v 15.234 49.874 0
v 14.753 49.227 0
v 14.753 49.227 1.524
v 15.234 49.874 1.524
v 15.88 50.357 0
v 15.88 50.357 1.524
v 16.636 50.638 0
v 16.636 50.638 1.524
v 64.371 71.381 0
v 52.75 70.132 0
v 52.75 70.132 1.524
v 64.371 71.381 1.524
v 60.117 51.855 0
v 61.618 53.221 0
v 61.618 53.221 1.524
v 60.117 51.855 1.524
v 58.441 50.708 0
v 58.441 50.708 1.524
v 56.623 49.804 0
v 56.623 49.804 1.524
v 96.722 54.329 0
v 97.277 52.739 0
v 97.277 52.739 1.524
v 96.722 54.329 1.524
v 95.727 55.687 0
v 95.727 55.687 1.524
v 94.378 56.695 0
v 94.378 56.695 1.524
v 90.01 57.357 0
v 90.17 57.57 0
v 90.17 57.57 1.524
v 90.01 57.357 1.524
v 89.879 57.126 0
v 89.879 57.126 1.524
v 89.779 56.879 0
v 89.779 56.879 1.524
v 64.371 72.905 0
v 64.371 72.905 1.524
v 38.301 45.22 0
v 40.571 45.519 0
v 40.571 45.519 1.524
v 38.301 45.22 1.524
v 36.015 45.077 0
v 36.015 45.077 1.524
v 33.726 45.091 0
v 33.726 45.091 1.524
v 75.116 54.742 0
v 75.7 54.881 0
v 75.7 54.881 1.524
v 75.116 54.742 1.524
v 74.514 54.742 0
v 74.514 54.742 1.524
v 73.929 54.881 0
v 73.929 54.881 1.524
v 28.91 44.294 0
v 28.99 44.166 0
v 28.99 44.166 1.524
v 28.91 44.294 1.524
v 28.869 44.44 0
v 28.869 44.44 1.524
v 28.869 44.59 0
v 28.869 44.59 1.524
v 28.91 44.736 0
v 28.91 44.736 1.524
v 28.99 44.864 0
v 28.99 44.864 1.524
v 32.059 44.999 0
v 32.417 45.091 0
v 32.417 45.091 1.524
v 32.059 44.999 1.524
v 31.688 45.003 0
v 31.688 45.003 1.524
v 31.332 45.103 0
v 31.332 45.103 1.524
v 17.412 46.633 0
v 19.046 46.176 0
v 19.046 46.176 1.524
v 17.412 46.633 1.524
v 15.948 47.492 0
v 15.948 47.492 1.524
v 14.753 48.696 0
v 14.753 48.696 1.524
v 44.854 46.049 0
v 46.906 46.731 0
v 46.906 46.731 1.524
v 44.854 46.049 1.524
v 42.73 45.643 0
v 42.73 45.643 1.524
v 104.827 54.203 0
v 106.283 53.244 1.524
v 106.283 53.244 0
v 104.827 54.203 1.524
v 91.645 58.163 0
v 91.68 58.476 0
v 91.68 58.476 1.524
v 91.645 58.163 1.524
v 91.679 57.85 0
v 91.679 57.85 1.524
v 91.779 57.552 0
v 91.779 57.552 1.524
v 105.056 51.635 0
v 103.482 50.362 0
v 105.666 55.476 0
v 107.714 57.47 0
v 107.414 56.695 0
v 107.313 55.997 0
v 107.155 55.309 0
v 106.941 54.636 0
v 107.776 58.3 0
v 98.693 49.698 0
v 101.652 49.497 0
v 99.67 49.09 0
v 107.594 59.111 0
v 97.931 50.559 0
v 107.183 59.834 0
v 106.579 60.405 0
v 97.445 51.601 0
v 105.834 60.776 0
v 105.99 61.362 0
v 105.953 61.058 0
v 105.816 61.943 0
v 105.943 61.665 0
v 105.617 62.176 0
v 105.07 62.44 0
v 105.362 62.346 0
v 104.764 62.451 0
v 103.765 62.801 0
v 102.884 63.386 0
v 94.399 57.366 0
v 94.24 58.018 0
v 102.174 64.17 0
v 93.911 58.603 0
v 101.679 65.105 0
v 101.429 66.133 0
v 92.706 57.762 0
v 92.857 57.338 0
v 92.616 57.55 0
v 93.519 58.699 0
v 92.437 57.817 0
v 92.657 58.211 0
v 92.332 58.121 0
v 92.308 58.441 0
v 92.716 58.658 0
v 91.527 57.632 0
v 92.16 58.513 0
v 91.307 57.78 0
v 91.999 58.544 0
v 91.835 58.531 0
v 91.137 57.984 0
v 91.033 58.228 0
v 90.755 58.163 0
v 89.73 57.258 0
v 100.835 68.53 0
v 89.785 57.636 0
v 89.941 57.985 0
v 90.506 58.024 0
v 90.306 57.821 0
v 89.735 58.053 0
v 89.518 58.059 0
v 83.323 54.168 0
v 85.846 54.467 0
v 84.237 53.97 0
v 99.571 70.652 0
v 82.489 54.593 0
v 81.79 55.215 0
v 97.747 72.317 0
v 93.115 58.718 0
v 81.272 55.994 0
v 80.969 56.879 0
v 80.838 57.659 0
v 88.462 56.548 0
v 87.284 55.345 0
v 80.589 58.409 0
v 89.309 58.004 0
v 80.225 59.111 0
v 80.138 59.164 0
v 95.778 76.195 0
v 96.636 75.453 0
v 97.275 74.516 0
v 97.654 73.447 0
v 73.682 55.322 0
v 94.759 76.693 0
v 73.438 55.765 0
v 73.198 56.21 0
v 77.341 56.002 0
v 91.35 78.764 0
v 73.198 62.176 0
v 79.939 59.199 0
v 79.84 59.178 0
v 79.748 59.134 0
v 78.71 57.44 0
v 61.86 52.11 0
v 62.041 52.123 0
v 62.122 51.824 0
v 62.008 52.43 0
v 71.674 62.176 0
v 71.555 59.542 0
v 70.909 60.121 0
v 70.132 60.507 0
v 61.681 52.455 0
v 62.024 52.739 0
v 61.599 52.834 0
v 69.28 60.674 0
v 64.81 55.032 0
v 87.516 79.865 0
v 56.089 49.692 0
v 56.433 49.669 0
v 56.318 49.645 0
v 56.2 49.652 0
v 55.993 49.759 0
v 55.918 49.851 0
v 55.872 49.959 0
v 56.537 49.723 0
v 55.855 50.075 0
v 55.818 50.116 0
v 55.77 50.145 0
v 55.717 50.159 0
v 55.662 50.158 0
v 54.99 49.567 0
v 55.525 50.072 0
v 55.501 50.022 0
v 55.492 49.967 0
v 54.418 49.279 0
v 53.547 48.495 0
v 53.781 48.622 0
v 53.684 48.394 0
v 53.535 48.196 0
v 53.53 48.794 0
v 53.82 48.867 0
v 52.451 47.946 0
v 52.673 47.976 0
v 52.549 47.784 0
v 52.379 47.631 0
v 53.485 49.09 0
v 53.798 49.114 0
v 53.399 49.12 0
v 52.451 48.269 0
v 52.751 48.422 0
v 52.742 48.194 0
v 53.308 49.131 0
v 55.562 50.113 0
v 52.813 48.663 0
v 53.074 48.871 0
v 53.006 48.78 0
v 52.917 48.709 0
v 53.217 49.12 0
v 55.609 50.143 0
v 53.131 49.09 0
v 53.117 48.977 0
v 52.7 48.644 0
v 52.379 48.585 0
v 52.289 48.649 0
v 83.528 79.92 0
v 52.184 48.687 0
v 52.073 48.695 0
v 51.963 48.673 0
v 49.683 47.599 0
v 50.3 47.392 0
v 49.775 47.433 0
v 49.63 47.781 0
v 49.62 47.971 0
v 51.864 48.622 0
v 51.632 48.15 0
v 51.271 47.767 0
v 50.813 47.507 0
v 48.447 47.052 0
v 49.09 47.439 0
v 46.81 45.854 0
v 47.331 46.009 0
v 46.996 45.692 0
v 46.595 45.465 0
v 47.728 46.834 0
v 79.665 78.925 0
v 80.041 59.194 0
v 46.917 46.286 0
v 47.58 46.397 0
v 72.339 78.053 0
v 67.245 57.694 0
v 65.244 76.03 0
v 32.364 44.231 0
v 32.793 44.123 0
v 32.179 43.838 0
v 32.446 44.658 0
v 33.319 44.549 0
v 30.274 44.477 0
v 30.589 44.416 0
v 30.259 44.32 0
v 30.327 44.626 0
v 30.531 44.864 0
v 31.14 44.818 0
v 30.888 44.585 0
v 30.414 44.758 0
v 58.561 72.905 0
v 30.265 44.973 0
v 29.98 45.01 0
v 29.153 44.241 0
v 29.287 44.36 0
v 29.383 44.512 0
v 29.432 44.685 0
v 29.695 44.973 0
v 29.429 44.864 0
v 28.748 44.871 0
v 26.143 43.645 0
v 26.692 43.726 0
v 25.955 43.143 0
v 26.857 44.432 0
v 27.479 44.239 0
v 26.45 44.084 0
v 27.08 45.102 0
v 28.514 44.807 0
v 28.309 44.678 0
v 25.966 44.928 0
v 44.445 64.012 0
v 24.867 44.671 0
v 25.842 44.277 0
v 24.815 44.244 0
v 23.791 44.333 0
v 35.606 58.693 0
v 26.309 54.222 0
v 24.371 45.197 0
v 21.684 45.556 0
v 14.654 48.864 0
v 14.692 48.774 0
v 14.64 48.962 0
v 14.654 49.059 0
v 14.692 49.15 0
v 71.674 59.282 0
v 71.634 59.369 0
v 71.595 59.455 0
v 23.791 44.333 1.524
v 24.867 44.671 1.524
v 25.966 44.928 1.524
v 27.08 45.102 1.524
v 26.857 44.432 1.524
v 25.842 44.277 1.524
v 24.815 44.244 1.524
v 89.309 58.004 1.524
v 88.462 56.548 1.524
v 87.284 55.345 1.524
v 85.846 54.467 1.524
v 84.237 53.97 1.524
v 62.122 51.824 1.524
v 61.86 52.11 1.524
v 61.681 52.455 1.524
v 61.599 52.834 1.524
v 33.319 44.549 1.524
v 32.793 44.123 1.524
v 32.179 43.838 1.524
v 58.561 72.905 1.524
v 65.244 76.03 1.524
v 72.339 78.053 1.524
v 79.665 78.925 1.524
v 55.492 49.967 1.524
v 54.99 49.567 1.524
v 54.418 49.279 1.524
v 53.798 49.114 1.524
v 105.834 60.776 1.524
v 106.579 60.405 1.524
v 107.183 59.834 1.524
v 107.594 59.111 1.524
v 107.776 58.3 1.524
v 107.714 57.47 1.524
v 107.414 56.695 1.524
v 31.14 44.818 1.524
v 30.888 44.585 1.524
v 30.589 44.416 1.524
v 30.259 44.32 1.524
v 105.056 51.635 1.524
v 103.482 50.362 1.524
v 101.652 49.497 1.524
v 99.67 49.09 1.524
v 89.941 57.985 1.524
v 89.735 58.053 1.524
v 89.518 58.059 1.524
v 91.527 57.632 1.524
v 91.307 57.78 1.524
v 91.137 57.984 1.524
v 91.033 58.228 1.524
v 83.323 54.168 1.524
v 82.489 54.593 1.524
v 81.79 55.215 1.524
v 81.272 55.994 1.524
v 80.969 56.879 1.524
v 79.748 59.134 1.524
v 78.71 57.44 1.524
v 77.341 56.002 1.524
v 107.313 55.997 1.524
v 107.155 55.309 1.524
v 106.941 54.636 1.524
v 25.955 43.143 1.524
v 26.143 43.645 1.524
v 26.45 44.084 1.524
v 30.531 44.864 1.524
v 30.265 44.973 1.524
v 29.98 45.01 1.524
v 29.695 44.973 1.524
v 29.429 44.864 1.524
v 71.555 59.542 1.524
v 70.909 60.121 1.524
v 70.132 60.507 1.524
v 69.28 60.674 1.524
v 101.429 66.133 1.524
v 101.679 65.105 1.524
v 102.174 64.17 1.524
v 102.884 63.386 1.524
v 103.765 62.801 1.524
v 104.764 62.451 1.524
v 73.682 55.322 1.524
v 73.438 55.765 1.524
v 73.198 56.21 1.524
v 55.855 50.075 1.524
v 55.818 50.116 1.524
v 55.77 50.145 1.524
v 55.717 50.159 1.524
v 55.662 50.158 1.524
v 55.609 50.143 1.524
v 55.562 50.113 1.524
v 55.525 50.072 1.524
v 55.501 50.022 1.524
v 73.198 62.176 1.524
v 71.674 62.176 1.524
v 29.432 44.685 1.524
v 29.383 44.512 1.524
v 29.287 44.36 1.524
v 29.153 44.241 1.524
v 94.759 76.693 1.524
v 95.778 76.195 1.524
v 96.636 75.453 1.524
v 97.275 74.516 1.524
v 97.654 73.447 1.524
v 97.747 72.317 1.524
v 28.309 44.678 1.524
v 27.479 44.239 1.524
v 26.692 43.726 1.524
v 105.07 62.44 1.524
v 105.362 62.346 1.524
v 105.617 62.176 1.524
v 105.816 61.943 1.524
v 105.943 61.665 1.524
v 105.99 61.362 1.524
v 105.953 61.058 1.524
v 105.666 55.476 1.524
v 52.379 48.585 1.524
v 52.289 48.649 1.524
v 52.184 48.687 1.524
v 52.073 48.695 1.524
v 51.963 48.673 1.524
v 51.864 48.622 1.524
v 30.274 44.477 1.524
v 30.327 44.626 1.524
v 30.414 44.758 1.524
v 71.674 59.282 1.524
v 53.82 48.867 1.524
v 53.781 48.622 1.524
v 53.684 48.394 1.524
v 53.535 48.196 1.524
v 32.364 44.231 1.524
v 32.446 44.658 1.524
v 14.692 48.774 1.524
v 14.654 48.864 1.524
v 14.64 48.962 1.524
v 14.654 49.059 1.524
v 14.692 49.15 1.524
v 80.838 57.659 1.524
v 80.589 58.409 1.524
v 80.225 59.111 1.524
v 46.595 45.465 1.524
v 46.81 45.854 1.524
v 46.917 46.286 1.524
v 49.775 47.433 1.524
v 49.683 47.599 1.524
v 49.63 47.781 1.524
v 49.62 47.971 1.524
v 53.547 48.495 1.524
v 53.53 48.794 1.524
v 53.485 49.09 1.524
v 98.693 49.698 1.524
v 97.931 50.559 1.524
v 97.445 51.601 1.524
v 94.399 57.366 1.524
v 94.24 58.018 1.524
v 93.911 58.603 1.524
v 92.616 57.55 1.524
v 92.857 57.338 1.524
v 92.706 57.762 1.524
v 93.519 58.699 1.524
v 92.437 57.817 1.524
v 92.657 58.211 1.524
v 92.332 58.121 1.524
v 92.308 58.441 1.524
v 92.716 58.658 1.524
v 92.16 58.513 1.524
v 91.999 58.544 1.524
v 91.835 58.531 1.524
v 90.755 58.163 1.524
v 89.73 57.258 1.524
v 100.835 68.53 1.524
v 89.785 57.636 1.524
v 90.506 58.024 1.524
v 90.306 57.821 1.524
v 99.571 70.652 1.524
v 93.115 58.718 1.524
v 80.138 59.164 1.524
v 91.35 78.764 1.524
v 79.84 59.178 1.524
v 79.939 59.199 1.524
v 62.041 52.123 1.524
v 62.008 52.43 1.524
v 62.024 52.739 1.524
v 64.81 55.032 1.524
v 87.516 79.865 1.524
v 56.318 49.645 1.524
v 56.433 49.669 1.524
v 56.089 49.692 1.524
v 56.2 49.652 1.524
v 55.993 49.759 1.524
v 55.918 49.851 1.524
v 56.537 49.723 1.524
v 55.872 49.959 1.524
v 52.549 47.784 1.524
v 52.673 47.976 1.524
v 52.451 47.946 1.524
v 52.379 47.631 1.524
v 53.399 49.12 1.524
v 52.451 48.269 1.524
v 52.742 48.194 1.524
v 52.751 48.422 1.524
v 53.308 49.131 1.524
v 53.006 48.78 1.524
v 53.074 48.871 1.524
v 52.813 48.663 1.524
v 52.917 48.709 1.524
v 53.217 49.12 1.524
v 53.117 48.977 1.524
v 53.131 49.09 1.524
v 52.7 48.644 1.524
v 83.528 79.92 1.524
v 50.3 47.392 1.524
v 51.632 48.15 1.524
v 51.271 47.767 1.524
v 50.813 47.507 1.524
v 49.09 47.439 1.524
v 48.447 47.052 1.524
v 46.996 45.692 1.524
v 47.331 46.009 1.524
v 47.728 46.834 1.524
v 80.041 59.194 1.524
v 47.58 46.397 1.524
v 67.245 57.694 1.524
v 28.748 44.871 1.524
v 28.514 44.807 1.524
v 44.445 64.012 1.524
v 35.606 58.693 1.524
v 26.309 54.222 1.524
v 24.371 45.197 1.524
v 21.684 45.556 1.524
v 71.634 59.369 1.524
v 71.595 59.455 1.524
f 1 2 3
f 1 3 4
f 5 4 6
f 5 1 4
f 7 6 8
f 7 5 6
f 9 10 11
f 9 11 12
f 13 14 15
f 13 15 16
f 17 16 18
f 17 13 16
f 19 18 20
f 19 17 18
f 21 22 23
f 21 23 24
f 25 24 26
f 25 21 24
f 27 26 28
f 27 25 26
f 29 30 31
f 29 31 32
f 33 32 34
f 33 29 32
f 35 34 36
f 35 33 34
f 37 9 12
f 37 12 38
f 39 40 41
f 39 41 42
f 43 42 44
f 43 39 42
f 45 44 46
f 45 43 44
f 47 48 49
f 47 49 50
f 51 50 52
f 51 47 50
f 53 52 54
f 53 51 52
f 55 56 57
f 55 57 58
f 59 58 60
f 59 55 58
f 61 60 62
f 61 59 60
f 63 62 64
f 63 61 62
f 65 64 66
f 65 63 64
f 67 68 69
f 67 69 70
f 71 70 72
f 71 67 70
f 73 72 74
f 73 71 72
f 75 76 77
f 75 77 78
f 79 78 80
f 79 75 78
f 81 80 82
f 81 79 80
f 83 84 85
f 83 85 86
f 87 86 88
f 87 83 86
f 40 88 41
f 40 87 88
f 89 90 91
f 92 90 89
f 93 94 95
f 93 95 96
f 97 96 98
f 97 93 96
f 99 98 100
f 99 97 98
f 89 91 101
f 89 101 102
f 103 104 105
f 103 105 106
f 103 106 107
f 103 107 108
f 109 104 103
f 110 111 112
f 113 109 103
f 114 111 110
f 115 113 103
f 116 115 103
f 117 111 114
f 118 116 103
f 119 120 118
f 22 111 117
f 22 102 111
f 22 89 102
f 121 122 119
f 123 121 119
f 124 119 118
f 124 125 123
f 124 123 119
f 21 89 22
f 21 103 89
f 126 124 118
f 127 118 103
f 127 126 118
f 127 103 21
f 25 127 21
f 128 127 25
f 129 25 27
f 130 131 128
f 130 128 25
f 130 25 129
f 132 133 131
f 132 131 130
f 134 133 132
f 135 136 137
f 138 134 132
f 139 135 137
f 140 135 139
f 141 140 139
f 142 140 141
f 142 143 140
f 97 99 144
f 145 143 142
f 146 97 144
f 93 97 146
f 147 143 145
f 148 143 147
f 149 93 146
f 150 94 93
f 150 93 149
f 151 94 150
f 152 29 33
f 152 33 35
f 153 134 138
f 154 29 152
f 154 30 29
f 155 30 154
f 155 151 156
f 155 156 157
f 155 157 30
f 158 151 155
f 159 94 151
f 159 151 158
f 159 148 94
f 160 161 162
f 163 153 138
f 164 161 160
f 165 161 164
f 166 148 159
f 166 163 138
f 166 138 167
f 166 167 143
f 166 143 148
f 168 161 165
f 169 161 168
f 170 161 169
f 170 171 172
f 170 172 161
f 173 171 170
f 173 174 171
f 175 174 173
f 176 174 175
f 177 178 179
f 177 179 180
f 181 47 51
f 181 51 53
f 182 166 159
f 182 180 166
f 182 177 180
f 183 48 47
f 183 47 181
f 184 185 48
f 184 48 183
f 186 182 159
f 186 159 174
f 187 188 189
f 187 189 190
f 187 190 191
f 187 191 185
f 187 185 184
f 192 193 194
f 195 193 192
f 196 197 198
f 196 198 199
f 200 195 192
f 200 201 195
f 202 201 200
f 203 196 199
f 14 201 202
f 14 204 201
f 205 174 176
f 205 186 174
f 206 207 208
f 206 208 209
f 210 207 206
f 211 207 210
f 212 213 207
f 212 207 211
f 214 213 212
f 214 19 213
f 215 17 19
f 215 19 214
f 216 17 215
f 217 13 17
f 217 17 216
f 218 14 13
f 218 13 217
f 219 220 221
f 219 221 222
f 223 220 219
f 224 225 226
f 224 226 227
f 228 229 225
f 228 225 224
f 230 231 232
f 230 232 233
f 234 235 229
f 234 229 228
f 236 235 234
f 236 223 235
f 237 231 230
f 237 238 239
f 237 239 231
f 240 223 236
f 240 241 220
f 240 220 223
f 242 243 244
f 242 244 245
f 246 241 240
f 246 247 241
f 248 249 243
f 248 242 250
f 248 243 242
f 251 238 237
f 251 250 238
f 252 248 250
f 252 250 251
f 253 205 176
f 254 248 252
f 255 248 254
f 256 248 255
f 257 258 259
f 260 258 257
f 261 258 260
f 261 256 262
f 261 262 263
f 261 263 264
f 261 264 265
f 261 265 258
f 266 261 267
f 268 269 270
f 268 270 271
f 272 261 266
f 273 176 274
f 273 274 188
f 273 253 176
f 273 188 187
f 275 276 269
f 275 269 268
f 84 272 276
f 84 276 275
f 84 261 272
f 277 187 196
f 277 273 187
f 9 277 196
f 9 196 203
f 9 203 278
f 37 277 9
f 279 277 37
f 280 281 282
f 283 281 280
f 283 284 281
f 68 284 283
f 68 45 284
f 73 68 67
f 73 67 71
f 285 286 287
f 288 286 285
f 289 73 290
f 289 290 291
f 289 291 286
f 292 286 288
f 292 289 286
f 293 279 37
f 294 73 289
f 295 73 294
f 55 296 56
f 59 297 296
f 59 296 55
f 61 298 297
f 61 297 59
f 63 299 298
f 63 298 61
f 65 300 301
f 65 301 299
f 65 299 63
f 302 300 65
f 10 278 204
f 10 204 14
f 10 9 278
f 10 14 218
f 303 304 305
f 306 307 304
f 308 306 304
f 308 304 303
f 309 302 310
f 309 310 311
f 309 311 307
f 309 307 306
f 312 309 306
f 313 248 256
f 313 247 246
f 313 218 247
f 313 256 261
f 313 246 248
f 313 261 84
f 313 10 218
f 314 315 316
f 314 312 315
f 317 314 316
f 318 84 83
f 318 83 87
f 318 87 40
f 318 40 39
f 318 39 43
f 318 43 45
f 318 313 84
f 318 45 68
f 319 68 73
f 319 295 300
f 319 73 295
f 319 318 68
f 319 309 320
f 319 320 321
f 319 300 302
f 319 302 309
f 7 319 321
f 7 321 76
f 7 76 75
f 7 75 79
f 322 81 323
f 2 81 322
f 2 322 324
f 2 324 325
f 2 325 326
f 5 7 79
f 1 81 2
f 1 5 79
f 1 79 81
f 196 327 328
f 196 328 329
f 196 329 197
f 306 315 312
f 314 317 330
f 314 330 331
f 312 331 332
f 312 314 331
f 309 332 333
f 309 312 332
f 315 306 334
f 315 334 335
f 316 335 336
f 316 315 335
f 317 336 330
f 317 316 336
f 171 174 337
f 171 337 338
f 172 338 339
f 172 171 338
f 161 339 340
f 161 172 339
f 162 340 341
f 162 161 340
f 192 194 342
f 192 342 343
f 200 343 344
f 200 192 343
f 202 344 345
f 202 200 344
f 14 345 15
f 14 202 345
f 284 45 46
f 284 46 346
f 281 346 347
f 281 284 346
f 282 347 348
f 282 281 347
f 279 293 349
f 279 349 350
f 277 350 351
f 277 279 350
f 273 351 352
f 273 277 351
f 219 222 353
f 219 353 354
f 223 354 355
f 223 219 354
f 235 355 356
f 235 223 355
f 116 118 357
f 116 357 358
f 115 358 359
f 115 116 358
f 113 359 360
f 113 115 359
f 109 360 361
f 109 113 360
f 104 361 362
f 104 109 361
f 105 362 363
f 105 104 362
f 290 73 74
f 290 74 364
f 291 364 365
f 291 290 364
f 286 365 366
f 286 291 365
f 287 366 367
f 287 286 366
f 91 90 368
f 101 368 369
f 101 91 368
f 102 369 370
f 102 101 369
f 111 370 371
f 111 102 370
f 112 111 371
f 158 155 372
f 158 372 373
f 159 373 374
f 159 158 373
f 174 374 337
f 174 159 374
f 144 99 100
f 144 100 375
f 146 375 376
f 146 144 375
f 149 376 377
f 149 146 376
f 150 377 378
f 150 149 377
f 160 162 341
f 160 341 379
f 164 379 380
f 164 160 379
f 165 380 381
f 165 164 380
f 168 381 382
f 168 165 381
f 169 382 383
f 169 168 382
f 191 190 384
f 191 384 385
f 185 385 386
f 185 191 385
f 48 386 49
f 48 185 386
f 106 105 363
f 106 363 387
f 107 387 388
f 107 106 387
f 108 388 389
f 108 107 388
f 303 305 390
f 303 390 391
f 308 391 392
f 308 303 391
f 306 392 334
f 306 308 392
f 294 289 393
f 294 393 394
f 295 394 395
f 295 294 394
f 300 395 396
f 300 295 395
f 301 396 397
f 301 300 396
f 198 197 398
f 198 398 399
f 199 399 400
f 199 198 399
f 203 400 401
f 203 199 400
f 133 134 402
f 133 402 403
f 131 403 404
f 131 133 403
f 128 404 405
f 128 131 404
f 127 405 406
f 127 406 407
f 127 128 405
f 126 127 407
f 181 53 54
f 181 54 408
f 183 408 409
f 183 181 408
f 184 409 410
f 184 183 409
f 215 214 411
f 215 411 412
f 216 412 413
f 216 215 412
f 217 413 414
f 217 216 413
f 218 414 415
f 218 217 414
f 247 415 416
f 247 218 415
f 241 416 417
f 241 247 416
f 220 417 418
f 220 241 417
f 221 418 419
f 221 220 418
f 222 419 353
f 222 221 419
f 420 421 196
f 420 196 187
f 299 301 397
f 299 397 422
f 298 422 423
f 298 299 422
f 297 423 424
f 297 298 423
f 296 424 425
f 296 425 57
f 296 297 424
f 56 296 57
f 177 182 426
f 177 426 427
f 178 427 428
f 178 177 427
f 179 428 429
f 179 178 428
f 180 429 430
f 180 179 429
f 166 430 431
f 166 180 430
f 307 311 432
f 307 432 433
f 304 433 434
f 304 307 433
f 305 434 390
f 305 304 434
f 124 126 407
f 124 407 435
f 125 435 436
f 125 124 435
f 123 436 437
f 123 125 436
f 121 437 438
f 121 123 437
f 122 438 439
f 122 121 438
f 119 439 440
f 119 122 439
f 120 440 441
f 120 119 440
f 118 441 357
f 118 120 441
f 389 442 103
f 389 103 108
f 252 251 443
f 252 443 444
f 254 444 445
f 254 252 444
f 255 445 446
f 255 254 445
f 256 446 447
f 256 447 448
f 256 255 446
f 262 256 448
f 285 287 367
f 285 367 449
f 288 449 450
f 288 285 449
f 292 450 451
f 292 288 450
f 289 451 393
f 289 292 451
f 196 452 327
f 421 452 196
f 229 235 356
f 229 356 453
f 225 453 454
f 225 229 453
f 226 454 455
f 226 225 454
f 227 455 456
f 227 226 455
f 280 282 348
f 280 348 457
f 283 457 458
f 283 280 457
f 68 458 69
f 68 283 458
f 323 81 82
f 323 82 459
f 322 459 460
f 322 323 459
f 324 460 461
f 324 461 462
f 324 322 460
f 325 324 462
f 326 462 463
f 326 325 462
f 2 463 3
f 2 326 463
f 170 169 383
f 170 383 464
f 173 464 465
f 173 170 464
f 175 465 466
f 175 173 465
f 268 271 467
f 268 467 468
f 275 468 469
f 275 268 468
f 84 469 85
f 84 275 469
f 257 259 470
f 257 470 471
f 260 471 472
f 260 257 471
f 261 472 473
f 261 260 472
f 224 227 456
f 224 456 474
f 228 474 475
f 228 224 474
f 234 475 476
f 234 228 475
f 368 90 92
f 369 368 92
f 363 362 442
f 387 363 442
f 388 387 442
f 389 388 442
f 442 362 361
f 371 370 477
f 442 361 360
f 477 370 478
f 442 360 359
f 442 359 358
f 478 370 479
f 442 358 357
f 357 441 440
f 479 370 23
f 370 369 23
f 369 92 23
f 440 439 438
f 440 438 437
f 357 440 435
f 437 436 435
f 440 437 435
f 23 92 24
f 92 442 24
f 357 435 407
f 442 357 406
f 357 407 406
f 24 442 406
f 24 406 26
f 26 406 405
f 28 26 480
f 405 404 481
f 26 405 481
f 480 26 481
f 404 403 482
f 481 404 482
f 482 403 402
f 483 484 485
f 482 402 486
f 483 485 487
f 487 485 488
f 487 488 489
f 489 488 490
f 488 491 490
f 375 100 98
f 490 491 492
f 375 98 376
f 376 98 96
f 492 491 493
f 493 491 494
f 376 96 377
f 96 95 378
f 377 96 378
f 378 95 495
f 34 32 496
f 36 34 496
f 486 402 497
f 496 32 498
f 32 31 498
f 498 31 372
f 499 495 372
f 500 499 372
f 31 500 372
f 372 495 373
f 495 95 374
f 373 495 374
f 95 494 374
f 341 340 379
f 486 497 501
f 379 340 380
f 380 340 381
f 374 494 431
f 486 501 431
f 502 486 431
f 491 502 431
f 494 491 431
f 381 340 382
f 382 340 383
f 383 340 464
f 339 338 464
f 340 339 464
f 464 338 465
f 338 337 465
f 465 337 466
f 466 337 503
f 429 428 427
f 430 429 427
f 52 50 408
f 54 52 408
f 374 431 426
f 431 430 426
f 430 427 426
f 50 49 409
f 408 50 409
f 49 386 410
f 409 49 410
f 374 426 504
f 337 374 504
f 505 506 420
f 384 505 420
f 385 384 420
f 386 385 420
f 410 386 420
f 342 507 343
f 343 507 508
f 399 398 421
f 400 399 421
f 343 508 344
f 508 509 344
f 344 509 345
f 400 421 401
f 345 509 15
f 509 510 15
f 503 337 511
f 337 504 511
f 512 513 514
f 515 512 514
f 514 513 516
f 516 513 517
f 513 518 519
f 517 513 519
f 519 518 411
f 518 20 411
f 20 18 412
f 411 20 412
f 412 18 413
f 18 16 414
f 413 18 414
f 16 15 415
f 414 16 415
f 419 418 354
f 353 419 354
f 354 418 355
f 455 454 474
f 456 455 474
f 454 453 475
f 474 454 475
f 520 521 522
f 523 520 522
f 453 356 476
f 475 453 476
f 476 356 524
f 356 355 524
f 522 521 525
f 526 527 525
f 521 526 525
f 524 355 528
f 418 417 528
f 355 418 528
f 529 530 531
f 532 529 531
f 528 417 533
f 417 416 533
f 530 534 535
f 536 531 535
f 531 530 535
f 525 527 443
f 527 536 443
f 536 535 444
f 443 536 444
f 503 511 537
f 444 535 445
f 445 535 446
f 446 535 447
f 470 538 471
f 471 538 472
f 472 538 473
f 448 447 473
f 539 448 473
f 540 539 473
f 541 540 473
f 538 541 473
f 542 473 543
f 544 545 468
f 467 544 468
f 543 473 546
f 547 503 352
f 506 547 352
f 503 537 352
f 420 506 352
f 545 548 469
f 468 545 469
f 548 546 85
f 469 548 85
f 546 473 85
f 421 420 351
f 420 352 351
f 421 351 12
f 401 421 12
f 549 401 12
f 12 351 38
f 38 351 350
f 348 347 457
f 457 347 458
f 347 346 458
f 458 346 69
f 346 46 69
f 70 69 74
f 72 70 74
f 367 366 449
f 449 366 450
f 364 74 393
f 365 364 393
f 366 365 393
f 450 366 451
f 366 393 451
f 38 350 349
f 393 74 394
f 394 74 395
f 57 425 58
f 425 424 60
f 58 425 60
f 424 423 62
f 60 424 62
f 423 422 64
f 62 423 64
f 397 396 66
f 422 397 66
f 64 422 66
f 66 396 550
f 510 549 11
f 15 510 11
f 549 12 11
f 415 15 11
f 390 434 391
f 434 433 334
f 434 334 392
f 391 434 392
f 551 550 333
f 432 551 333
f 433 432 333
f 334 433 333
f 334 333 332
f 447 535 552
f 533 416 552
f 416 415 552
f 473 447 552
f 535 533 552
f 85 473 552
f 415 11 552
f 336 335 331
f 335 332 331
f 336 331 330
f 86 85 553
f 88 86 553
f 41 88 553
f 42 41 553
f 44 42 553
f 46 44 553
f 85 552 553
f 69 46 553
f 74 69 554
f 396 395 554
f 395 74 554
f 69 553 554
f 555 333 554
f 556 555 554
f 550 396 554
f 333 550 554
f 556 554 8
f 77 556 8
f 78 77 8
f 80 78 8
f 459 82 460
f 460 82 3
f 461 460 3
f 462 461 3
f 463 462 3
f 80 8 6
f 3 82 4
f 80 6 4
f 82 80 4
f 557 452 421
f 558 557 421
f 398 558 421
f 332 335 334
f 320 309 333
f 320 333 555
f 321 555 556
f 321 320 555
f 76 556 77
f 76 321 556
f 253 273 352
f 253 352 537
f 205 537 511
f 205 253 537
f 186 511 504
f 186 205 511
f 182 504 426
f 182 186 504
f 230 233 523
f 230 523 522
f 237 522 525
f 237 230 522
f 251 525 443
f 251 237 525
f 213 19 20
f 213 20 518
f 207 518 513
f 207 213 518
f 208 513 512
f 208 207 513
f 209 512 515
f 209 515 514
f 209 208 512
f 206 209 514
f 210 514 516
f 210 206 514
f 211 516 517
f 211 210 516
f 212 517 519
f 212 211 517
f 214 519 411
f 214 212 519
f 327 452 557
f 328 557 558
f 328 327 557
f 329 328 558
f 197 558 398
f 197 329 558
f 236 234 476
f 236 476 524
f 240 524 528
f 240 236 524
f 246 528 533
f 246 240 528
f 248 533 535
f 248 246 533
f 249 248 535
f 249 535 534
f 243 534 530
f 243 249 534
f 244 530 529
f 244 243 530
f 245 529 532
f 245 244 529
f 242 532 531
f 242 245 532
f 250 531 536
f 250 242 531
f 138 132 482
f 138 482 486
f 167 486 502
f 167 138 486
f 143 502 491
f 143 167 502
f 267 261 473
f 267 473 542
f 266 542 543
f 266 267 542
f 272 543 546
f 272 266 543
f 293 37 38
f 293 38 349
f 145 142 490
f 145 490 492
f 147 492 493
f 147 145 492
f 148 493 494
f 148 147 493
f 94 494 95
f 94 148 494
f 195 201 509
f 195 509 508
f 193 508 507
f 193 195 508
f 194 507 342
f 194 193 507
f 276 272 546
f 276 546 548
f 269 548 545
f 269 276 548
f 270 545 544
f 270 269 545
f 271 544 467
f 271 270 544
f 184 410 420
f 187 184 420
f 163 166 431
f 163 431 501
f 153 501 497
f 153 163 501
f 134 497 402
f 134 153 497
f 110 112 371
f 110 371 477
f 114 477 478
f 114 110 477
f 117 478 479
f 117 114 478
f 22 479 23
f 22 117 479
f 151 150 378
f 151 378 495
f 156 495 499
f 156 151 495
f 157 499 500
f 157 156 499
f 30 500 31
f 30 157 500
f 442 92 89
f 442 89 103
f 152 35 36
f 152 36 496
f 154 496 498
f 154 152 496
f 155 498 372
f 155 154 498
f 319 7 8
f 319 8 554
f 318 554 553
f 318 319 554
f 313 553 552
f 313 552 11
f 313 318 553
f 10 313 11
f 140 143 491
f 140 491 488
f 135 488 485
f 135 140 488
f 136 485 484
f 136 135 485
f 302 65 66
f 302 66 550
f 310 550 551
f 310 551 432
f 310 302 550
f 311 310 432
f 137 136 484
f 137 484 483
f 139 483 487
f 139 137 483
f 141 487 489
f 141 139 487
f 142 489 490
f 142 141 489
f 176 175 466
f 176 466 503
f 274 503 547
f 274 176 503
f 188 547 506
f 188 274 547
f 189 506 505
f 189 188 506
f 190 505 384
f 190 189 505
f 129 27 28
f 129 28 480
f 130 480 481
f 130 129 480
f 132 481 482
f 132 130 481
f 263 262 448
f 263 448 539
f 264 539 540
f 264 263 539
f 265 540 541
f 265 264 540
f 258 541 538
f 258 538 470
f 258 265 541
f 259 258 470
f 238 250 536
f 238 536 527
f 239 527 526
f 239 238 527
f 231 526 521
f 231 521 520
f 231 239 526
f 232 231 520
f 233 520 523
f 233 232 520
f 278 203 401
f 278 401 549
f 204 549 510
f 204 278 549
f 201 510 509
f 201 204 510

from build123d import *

# Parameters (mm, degrees)
BOSS_EXTRUDE1_DEPTH = 1.524
SKETCH2_W           = 1.524
SKETCH2_H           = 5.96660367
CUT_EXTRUDE3_DEPTH  = 135.253240476


with BuildPart() as part:
    # Sketch1 → Boss-Extrude1 (new body)
    with BuildSketch(Plane.XY):
        with BuildLine():
            Line((52.749938031, 70.131845749), (64.371465794, 71.381472391))
            Line((64.371465794, 71.381472391), (64.371465794, 72.905472391))
            Line((64.371465794, 72.905472391), (58.560701913, 72.905472391))
            ThreePointArc((58.560701913, 72.905472391), (68.751288874, 77.18302052), (79.665108288, 78.924866217))
            ThreePointArc((79.665108288, 78.924866217), (87.51605356, 79.864840631), (94.759202069, 76.693453987))
            ThreePointArc((94.759202069, 76.693453987), (96.985502082, 75.005001445), (97.746636466, 72.316515219))
            ThreePointArc((97.746636466, 72.316515219), (100.280996817, 69.637712422), (101.428823049, 66.133220769))
            ThreePointArc((101.428823049, 66.133220769), (102.504441665, 63.756169776), (104.763633539, 62.451034186))
            ThreePointArc((104.763633539, 62.451034186), (105.815523966, 61.94348794), (105.834353574, 60.775702811))
            ThreePointArc((105.834353574, 60.775702811), (107.593647808, 59.110829557), (107.413611762, 56.69535731))
            ThreePointArc((107.413611762, 56.69535731), (104.915486102, 51.493806045), (99.669748601, 49.089849838))
            ThreePointArc((99.669748601, 49.089849838), (97.93078373, 50.558543058), (97.277362732, 52.738932839))
            ThreePointArc((97.277362732, 52.738932839), (96.275148178, 55.045205965), (94.377694548, 56.69535731))
            ThreePointArc((94.377694548, 56.69535731), (94.341947265, 57.697226126), (93.911436782, 58.602587774))
            ThreePointArc((93.911436782, 58.602587774), (93.31755476, 58.718236433), (92.715544448, 58.657787675))
            ThreePointArc((92.715544448, 58.657787675), (92.668251349, 57.985085863), (92.857476868, 57.337816162))
            ThreePointArc((92.857476868, 57.337816162), (92.437007408, 57.816991843), (92.308352921, 58.441373075))
            ThreePointArc((92.308352921, 58.441373075), (91.998939648, 58.544100362), (91.680077423, 58.476156637))
            ThreePointArc((91.680077423, 58.476156637), (91.653768646, 58.005927685), (91.779444676, 57.552041185))
            ThreePointArc((91.779444676, 57.552041185), (91.306585055, 57.779976677), (91.03290283, 58.22791512))
            ThreePointArc((91.03290283, 58.22791512), (90.50619799, 58.023829811), (90.170237064, 57.569738347))
            ThreePointArc((90.170237064, 57.569738347), (89.940738286, 57.243637966), (89.778811712, 56.879233065))
            ThreePointArc((89.778811712, 56.879233065), (89.744476135, 57.449042317), (89.940738286, 57.985085863))
            ThreePointArc((89.940738286, 57.985085863), (89.626896453, 58.063679483), (89.308840631, 58.00439924))
            ThreePointArc((89.308840631, 58.00439924), (87.283822401, 55.344960061), (84.23724791, 53.969569406))
            ThreePointArc((84.23724791, 53.969569406), (82.119422653, 54.881253432), (80.968584276, 56.879233065))
            ThreePointArc((80.968584276, 56.879233065), (80.728221934, 58.038765282), (80.225263479, 59.110829557))
            ThreePointArc((80.225263479, 59.110829557), (79.990436789, 59.199276584), (79.74821764, 59.133730156))
            ThreePointArc((79.74821764, 59.133730156), (78.063200875, 56.684963047), (75.700496179, 54.881253432))
            ThreePointArc((75.700496179, 54.881253432), (74.814943925, 54.724384759), (73.92939167, 54.881253432))
            ThreePointArc((73.92939167, 54.881253432), (72.689360724, 57.184690211), (71.555199225, 59.542056419))
            ThreePointArc((71.555199225, 59.542056419), (70.53318823, 60.33987445), (69.280379472, 60.673776077))
            ThreePointArc((69.280379472, 60.673776077), (66.074534091, 56.320096732), (62.023949735, 52.738932839))
            ThreePointArc((62.023949735, 52.738932839), (62.018158819, 52.275784748), (62.122280661, 51.824455233))
            ThreePointArc((62.122280661, 51.824455233), (61.681410811, 52.454602529), (61.618245883, 53.221063245))
            ThreePointArc((61.618245883, 53.221063245), (59.29856558, 51.252524719), (56.623131886, 49.804037512))
            ThreePointArc((56.623131886, 49.804037512), (56.143365032, 49.668212915), (55.855452098, 50.075313269))
            ThreePointArc((55.855452098, 50.075313269), (55.634539123, 50.152406549), (55.491712516, 49.967078524))
            ThreePointArc((55.491712516, 49.967078524), (54.711546462, 49.408479108), (53.79819099, 49.114414214))
            ThreePointArc((53.79819099, 49.114414214), (53.781075658, 48.622130566), (53.534831875, 48.19551584))
            ThreePointArc((53.534831875, 48.19551584), (53.542028616, 48.644457223), (53.48523445, 49.089849838))
            ThreePointArc((53.48523445, 49.089849838), (53.3082991, 49.130815552), (53.13136375, 49.089849838))
            ThreePointArc((53.13136375, 49.089849838), (53.00604404, 48.779905646), (52.700390386, 48.644457223))
            ThreePointArc((52.700390386, 48.644457223), (52.714349204, 48.082434529), (52.379221144, 47.631043855))
            ThreePointArc((52.379221144, 47.631043855), (52.460297524, 48.107812169), (52.379221144, 48.584580484))
            ThreePointArc((52.379221144, 48.584580484), (52.12852371, 48.695194866), (51.864428363, 48.622130566))
            ThreePointArc((51.864428363, 48.622130566), (51.051818187, 47.620090335), (49.775293704, 47.433261089))
            ThreePointArc((49.775293704, 47.433261089), (49.651036263, 47.688587532), (49.62023506, 47.970868935))
            ThreePointArc((49.62023506, 47.970868935), (48.780471907, 47.225294105), (47.727759637, 46.834294287))
            ThreePointArc((47.727759637, 46.834294287), (47.331273993, 46.008852436), (46.594544028, 45.464992092))
            ThreePointArc((46.594544028, 45.464992092), (46.877970347, 46.066432963), (46.906161005, 46.730712185))
            ThreePointArc((46.906161005, 46.730712185), (43.798654282, 45.811386919), (40.571228797, 45.519014346))
            ThreePointArc((40.571228797, 45.519014346), (37.159419224, 45.129203066), (33.725626021, 45.090971596))
            ThreePointArc((33.725626021, 45.090971596), (33.068999074, 44.320201948), (32.178585471, 43.838114389))
            ThreePointArc((32.178585471, 43.838114389), (32.418564973, 44.441560177), (32.417226894, 45.090971596))
            ThreePointArc((32.417226894, 45.090971596), (31.873442168, 44.988363543), (31.332044302, 45.102899962))
            ThreePointArc((31.332044302, 45.102899962), (30.887683341, 44.585264996), (30.259078376, 44.320201948))
            ThreePointArc((30.259078376, 44.320201948), (30.326970235, 44.626264328), (30.531184649, 44.864129748))
            ThreePointArc((30.531184649, 44.864129748), (29.980102952, 45.010427729), (29.429021254, 44.864129748))
            ThreePointArc((29.429021254, 44.864129748), (29.340661001, 44.432357132), (28.989623083, 44.165884794))
            ThreePointArc((28.989623083, 44.165884794), (28.864149038, 44.515007271), (28.989623083, 44.864129748))
            ThreePointArc((28.989623083, 44.864129748), (28.628355518, 44.84783713), (28.30893512, 44.678277961))
            ThreePointArc((28.30893512, 44.678277961), (27.079850519, 43.991023465), (25.955408412, 43.143322074))
            ThreePointArc((25.955408412, 43.143322074), (26.282852866, 43.874201462), (26.857193183, 44.432357132))
            ThreePointArc((26.857193183, 44.432357132), (25.328745526, 44.244978672), (23.791384091, 44.333198545))
            ThreePointArc((23.791384091, 44.333198545), (25.414182464, 44.809450383), (27.079850519, 45.102435547))
            ThreePointArc((27.079850519, 45.102435547), (23.023366565, 45.343696153), (19.045869652, 46.176034458))
            ThreePointArc((19.045869652, 46.176034458), (16.652090777, 47.015108036), (14.752643777, 48.696275152))
            ThreePointArc((14.752643777, 48.696275152), (14.640422349, 48.961729487), (14.752643777, 49.227183822))
            ThreePointArc((14.752643777, 49.227183822), (15.539561177, 50.138860369), (16.635728101, 50.637670147))
            ThreePointArc((16.635728101, 50.637670147), (35.605852794, 58.693330375), (52.749938031, 70.131845749))
        make_face()
    extrude(amount=BOSS_EXTRUDE1_DEPTH)

    # Sketch2 → Cut-Extrude3 (cut, through all)
    with BuildSketch(Plane.XY.offset(1.524)):
        with Locations((72.435845658, 59.192908392)):
            Rectangle(SKETCH2_W, SKETCH2_H)
        Polygon((106.940547802, 54.636029996), (106.397081003, 53.169068481), (104.827290354, 54.203248276), (105.665710767, 55.475894028), align=None)
    extrude(amount=-CUT_EXTRUDE3_DEPTH, mode=Mode.SUBTRACT)


with BuildPart() as cut_extrude3_kept_piece:
    # of the separate pieces the step leaves, the one the design keeps (cut_extrude3_pieces_kept)
    add(part.part.solids().sort_by_distance((16.635728101, 50.637670147, 0))[0])


solid = cut_extrude3_kept_piece.part
